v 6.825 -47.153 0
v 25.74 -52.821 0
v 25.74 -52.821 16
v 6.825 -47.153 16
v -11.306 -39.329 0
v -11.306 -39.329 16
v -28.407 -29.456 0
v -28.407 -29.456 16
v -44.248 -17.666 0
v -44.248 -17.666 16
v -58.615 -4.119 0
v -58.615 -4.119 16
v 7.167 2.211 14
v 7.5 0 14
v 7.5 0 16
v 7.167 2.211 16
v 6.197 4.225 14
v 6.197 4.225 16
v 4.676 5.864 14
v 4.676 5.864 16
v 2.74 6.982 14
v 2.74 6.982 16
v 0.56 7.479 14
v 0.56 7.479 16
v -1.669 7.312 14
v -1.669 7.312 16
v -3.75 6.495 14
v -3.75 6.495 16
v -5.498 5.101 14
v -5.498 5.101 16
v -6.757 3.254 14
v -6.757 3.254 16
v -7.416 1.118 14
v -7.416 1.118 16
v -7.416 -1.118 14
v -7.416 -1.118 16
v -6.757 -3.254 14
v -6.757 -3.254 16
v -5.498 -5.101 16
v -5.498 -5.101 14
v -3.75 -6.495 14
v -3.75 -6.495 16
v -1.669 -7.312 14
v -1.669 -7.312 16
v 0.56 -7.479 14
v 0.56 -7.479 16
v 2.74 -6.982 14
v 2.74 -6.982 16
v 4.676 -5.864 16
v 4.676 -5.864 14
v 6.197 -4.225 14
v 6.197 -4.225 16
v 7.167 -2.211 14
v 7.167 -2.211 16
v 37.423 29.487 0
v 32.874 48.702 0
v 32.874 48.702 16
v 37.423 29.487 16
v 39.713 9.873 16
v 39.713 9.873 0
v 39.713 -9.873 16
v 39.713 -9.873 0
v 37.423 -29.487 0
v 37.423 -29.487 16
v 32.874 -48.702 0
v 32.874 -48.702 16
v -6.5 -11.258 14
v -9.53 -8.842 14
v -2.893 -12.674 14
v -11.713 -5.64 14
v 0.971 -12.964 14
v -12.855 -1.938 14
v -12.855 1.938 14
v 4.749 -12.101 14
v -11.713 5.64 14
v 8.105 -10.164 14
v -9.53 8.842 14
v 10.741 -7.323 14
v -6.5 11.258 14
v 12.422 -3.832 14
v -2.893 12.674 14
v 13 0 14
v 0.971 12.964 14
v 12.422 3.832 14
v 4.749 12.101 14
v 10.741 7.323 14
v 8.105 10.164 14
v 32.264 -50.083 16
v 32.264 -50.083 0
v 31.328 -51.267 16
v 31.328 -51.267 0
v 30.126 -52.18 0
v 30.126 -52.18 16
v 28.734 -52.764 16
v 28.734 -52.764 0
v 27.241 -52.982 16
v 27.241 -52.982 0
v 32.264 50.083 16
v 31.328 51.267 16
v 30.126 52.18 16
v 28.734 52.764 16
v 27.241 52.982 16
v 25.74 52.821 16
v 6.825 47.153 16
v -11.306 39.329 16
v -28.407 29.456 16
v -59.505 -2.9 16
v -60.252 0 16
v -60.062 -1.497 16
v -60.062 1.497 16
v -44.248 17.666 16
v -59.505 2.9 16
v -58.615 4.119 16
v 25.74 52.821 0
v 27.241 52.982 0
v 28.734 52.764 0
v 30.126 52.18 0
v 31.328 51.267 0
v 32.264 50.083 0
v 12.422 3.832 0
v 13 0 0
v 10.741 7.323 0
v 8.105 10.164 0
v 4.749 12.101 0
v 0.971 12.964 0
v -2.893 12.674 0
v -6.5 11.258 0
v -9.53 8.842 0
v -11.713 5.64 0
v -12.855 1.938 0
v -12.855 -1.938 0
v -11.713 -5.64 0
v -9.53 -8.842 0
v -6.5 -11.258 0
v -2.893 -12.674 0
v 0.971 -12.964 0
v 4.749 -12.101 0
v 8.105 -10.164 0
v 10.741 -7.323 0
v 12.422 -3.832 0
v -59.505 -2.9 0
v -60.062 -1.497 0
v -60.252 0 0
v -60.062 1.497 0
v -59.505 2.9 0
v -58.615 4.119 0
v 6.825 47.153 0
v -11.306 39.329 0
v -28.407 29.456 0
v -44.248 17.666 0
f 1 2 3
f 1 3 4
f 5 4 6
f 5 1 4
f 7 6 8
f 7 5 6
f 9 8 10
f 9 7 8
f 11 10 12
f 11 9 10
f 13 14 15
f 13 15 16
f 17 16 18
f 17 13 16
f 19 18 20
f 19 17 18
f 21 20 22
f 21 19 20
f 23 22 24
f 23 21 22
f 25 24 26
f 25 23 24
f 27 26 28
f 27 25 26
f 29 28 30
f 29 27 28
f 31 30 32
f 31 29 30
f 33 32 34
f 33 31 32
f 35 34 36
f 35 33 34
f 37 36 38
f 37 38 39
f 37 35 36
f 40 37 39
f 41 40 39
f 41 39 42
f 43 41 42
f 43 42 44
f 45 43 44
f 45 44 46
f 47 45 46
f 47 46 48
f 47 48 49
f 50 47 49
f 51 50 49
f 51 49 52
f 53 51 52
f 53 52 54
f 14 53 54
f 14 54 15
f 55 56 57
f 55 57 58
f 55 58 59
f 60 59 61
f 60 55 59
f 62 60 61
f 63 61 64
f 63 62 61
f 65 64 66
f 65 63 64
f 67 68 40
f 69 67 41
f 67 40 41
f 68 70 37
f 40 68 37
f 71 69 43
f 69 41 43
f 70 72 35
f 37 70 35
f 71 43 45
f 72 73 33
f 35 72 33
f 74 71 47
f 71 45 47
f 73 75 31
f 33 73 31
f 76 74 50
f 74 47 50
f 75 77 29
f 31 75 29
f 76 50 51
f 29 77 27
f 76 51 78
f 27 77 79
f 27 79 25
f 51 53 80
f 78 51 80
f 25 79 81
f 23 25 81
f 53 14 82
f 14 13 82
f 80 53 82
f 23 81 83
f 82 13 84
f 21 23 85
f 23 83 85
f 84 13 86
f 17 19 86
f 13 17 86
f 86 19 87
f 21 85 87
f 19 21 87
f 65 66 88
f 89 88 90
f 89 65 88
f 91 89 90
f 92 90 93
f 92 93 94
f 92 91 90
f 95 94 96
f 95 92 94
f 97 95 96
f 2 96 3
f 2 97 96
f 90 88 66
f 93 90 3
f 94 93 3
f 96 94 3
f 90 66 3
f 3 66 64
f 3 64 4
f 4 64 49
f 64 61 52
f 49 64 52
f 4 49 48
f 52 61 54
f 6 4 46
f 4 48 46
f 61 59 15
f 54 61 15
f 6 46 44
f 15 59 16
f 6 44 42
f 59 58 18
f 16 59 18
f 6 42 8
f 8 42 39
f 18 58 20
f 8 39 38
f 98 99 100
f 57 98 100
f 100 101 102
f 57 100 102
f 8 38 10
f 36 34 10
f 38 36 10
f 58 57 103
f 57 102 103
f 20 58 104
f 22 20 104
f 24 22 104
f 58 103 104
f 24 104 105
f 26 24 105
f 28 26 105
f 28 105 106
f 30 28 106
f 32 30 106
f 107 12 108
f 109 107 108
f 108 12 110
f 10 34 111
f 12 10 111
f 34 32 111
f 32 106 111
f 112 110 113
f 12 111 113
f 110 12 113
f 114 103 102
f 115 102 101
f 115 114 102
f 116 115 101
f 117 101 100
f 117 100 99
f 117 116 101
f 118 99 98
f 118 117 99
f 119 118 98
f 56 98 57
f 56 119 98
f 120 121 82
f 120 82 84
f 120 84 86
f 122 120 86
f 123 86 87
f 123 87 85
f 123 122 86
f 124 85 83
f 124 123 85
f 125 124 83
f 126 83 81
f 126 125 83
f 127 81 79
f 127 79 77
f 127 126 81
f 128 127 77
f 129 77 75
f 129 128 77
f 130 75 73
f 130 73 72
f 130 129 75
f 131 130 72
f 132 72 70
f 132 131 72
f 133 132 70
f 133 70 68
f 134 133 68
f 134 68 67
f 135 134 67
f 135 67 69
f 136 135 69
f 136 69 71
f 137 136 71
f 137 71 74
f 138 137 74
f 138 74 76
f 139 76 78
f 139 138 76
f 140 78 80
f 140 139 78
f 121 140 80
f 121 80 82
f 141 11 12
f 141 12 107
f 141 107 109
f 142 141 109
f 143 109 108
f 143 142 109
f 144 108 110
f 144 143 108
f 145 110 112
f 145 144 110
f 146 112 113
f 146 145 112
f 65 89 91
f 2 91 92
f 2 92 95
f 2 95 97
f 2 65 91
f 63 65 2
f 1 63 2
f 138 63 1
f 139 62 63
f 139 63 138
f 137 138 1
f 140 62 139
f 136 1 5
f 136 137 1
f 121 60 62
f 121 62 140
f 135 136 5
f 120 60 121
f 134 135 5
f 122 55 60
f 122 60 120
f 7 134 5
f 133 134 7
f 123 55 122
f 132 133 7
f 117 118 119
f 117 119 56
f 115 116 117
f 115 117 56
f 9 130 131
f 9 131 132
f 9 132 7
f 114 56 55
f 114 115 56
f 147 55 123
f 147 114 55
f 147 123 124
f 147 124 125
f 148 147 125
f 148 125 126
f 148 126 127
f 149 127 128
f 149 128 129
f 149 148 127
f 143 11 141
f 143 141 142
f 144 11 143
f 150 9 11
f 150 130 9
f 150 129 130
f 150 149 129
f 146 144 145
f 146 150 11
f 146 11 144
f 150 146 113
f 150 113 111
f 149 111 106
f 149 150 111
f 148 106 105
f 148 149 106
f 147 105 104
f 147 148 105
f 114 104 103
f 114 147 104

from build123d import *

# Parameters (mm, degrees)
ESQUISSE1_R             = 7.5
BASE_EXTRUSION_DEPTH    = 16
ESQUISSE2_R             = 13
ENL_V_MAT_EXTRU_2_DEPTH = 14


with BuildPart() as part:
    # Esquisse1 → Base-Extrusion (new body)
    with BuildSketch(Plane.XY):
        with BuildLine():
            ThreePointArc((25.740280008, -52.821275395), (-20, -34.641016151), (-58.614706356, -4.118901311))
            ThreePointArc((-58.614706356, -4.118901311), (-60.251834367, 0), (-58.614706356, 4.118901311))
            ThreePointArc((-58.614706356, 4.118901311), (-20, 34.641016151), (25.740280008, 52.821275395))
            ThreePointArc((25.740280008, 52.821275395), (30.125917184, 52.179619187), (32.874426349, 48.702374085))
            ThreePointArc((32.874426349, 48.702374085), (40, 0), (32.874426349, -48.702374085))
            ThreePointArc((32.874426349, -48.702374085), (30.125917184, -52.179619187), (25.740280008, -52.821275395))
        make_face()
        Circle(ESQUISSE1_R, mode=Mode.SUBTRACT)
    extrude(amount=BASE_EXTRUSION_DEPTH)

    # Esquisse2 → Enlèv. mat.-Extru.2 (cut)
    with BuildSketch(Plane.XY):
        Circle(ESQUISSE2_R)
    extrude(amount=ENL_V_MAT_EXTRU_2_DEPTH, mode=Mode.SUBTRACT)


solid = part.part
